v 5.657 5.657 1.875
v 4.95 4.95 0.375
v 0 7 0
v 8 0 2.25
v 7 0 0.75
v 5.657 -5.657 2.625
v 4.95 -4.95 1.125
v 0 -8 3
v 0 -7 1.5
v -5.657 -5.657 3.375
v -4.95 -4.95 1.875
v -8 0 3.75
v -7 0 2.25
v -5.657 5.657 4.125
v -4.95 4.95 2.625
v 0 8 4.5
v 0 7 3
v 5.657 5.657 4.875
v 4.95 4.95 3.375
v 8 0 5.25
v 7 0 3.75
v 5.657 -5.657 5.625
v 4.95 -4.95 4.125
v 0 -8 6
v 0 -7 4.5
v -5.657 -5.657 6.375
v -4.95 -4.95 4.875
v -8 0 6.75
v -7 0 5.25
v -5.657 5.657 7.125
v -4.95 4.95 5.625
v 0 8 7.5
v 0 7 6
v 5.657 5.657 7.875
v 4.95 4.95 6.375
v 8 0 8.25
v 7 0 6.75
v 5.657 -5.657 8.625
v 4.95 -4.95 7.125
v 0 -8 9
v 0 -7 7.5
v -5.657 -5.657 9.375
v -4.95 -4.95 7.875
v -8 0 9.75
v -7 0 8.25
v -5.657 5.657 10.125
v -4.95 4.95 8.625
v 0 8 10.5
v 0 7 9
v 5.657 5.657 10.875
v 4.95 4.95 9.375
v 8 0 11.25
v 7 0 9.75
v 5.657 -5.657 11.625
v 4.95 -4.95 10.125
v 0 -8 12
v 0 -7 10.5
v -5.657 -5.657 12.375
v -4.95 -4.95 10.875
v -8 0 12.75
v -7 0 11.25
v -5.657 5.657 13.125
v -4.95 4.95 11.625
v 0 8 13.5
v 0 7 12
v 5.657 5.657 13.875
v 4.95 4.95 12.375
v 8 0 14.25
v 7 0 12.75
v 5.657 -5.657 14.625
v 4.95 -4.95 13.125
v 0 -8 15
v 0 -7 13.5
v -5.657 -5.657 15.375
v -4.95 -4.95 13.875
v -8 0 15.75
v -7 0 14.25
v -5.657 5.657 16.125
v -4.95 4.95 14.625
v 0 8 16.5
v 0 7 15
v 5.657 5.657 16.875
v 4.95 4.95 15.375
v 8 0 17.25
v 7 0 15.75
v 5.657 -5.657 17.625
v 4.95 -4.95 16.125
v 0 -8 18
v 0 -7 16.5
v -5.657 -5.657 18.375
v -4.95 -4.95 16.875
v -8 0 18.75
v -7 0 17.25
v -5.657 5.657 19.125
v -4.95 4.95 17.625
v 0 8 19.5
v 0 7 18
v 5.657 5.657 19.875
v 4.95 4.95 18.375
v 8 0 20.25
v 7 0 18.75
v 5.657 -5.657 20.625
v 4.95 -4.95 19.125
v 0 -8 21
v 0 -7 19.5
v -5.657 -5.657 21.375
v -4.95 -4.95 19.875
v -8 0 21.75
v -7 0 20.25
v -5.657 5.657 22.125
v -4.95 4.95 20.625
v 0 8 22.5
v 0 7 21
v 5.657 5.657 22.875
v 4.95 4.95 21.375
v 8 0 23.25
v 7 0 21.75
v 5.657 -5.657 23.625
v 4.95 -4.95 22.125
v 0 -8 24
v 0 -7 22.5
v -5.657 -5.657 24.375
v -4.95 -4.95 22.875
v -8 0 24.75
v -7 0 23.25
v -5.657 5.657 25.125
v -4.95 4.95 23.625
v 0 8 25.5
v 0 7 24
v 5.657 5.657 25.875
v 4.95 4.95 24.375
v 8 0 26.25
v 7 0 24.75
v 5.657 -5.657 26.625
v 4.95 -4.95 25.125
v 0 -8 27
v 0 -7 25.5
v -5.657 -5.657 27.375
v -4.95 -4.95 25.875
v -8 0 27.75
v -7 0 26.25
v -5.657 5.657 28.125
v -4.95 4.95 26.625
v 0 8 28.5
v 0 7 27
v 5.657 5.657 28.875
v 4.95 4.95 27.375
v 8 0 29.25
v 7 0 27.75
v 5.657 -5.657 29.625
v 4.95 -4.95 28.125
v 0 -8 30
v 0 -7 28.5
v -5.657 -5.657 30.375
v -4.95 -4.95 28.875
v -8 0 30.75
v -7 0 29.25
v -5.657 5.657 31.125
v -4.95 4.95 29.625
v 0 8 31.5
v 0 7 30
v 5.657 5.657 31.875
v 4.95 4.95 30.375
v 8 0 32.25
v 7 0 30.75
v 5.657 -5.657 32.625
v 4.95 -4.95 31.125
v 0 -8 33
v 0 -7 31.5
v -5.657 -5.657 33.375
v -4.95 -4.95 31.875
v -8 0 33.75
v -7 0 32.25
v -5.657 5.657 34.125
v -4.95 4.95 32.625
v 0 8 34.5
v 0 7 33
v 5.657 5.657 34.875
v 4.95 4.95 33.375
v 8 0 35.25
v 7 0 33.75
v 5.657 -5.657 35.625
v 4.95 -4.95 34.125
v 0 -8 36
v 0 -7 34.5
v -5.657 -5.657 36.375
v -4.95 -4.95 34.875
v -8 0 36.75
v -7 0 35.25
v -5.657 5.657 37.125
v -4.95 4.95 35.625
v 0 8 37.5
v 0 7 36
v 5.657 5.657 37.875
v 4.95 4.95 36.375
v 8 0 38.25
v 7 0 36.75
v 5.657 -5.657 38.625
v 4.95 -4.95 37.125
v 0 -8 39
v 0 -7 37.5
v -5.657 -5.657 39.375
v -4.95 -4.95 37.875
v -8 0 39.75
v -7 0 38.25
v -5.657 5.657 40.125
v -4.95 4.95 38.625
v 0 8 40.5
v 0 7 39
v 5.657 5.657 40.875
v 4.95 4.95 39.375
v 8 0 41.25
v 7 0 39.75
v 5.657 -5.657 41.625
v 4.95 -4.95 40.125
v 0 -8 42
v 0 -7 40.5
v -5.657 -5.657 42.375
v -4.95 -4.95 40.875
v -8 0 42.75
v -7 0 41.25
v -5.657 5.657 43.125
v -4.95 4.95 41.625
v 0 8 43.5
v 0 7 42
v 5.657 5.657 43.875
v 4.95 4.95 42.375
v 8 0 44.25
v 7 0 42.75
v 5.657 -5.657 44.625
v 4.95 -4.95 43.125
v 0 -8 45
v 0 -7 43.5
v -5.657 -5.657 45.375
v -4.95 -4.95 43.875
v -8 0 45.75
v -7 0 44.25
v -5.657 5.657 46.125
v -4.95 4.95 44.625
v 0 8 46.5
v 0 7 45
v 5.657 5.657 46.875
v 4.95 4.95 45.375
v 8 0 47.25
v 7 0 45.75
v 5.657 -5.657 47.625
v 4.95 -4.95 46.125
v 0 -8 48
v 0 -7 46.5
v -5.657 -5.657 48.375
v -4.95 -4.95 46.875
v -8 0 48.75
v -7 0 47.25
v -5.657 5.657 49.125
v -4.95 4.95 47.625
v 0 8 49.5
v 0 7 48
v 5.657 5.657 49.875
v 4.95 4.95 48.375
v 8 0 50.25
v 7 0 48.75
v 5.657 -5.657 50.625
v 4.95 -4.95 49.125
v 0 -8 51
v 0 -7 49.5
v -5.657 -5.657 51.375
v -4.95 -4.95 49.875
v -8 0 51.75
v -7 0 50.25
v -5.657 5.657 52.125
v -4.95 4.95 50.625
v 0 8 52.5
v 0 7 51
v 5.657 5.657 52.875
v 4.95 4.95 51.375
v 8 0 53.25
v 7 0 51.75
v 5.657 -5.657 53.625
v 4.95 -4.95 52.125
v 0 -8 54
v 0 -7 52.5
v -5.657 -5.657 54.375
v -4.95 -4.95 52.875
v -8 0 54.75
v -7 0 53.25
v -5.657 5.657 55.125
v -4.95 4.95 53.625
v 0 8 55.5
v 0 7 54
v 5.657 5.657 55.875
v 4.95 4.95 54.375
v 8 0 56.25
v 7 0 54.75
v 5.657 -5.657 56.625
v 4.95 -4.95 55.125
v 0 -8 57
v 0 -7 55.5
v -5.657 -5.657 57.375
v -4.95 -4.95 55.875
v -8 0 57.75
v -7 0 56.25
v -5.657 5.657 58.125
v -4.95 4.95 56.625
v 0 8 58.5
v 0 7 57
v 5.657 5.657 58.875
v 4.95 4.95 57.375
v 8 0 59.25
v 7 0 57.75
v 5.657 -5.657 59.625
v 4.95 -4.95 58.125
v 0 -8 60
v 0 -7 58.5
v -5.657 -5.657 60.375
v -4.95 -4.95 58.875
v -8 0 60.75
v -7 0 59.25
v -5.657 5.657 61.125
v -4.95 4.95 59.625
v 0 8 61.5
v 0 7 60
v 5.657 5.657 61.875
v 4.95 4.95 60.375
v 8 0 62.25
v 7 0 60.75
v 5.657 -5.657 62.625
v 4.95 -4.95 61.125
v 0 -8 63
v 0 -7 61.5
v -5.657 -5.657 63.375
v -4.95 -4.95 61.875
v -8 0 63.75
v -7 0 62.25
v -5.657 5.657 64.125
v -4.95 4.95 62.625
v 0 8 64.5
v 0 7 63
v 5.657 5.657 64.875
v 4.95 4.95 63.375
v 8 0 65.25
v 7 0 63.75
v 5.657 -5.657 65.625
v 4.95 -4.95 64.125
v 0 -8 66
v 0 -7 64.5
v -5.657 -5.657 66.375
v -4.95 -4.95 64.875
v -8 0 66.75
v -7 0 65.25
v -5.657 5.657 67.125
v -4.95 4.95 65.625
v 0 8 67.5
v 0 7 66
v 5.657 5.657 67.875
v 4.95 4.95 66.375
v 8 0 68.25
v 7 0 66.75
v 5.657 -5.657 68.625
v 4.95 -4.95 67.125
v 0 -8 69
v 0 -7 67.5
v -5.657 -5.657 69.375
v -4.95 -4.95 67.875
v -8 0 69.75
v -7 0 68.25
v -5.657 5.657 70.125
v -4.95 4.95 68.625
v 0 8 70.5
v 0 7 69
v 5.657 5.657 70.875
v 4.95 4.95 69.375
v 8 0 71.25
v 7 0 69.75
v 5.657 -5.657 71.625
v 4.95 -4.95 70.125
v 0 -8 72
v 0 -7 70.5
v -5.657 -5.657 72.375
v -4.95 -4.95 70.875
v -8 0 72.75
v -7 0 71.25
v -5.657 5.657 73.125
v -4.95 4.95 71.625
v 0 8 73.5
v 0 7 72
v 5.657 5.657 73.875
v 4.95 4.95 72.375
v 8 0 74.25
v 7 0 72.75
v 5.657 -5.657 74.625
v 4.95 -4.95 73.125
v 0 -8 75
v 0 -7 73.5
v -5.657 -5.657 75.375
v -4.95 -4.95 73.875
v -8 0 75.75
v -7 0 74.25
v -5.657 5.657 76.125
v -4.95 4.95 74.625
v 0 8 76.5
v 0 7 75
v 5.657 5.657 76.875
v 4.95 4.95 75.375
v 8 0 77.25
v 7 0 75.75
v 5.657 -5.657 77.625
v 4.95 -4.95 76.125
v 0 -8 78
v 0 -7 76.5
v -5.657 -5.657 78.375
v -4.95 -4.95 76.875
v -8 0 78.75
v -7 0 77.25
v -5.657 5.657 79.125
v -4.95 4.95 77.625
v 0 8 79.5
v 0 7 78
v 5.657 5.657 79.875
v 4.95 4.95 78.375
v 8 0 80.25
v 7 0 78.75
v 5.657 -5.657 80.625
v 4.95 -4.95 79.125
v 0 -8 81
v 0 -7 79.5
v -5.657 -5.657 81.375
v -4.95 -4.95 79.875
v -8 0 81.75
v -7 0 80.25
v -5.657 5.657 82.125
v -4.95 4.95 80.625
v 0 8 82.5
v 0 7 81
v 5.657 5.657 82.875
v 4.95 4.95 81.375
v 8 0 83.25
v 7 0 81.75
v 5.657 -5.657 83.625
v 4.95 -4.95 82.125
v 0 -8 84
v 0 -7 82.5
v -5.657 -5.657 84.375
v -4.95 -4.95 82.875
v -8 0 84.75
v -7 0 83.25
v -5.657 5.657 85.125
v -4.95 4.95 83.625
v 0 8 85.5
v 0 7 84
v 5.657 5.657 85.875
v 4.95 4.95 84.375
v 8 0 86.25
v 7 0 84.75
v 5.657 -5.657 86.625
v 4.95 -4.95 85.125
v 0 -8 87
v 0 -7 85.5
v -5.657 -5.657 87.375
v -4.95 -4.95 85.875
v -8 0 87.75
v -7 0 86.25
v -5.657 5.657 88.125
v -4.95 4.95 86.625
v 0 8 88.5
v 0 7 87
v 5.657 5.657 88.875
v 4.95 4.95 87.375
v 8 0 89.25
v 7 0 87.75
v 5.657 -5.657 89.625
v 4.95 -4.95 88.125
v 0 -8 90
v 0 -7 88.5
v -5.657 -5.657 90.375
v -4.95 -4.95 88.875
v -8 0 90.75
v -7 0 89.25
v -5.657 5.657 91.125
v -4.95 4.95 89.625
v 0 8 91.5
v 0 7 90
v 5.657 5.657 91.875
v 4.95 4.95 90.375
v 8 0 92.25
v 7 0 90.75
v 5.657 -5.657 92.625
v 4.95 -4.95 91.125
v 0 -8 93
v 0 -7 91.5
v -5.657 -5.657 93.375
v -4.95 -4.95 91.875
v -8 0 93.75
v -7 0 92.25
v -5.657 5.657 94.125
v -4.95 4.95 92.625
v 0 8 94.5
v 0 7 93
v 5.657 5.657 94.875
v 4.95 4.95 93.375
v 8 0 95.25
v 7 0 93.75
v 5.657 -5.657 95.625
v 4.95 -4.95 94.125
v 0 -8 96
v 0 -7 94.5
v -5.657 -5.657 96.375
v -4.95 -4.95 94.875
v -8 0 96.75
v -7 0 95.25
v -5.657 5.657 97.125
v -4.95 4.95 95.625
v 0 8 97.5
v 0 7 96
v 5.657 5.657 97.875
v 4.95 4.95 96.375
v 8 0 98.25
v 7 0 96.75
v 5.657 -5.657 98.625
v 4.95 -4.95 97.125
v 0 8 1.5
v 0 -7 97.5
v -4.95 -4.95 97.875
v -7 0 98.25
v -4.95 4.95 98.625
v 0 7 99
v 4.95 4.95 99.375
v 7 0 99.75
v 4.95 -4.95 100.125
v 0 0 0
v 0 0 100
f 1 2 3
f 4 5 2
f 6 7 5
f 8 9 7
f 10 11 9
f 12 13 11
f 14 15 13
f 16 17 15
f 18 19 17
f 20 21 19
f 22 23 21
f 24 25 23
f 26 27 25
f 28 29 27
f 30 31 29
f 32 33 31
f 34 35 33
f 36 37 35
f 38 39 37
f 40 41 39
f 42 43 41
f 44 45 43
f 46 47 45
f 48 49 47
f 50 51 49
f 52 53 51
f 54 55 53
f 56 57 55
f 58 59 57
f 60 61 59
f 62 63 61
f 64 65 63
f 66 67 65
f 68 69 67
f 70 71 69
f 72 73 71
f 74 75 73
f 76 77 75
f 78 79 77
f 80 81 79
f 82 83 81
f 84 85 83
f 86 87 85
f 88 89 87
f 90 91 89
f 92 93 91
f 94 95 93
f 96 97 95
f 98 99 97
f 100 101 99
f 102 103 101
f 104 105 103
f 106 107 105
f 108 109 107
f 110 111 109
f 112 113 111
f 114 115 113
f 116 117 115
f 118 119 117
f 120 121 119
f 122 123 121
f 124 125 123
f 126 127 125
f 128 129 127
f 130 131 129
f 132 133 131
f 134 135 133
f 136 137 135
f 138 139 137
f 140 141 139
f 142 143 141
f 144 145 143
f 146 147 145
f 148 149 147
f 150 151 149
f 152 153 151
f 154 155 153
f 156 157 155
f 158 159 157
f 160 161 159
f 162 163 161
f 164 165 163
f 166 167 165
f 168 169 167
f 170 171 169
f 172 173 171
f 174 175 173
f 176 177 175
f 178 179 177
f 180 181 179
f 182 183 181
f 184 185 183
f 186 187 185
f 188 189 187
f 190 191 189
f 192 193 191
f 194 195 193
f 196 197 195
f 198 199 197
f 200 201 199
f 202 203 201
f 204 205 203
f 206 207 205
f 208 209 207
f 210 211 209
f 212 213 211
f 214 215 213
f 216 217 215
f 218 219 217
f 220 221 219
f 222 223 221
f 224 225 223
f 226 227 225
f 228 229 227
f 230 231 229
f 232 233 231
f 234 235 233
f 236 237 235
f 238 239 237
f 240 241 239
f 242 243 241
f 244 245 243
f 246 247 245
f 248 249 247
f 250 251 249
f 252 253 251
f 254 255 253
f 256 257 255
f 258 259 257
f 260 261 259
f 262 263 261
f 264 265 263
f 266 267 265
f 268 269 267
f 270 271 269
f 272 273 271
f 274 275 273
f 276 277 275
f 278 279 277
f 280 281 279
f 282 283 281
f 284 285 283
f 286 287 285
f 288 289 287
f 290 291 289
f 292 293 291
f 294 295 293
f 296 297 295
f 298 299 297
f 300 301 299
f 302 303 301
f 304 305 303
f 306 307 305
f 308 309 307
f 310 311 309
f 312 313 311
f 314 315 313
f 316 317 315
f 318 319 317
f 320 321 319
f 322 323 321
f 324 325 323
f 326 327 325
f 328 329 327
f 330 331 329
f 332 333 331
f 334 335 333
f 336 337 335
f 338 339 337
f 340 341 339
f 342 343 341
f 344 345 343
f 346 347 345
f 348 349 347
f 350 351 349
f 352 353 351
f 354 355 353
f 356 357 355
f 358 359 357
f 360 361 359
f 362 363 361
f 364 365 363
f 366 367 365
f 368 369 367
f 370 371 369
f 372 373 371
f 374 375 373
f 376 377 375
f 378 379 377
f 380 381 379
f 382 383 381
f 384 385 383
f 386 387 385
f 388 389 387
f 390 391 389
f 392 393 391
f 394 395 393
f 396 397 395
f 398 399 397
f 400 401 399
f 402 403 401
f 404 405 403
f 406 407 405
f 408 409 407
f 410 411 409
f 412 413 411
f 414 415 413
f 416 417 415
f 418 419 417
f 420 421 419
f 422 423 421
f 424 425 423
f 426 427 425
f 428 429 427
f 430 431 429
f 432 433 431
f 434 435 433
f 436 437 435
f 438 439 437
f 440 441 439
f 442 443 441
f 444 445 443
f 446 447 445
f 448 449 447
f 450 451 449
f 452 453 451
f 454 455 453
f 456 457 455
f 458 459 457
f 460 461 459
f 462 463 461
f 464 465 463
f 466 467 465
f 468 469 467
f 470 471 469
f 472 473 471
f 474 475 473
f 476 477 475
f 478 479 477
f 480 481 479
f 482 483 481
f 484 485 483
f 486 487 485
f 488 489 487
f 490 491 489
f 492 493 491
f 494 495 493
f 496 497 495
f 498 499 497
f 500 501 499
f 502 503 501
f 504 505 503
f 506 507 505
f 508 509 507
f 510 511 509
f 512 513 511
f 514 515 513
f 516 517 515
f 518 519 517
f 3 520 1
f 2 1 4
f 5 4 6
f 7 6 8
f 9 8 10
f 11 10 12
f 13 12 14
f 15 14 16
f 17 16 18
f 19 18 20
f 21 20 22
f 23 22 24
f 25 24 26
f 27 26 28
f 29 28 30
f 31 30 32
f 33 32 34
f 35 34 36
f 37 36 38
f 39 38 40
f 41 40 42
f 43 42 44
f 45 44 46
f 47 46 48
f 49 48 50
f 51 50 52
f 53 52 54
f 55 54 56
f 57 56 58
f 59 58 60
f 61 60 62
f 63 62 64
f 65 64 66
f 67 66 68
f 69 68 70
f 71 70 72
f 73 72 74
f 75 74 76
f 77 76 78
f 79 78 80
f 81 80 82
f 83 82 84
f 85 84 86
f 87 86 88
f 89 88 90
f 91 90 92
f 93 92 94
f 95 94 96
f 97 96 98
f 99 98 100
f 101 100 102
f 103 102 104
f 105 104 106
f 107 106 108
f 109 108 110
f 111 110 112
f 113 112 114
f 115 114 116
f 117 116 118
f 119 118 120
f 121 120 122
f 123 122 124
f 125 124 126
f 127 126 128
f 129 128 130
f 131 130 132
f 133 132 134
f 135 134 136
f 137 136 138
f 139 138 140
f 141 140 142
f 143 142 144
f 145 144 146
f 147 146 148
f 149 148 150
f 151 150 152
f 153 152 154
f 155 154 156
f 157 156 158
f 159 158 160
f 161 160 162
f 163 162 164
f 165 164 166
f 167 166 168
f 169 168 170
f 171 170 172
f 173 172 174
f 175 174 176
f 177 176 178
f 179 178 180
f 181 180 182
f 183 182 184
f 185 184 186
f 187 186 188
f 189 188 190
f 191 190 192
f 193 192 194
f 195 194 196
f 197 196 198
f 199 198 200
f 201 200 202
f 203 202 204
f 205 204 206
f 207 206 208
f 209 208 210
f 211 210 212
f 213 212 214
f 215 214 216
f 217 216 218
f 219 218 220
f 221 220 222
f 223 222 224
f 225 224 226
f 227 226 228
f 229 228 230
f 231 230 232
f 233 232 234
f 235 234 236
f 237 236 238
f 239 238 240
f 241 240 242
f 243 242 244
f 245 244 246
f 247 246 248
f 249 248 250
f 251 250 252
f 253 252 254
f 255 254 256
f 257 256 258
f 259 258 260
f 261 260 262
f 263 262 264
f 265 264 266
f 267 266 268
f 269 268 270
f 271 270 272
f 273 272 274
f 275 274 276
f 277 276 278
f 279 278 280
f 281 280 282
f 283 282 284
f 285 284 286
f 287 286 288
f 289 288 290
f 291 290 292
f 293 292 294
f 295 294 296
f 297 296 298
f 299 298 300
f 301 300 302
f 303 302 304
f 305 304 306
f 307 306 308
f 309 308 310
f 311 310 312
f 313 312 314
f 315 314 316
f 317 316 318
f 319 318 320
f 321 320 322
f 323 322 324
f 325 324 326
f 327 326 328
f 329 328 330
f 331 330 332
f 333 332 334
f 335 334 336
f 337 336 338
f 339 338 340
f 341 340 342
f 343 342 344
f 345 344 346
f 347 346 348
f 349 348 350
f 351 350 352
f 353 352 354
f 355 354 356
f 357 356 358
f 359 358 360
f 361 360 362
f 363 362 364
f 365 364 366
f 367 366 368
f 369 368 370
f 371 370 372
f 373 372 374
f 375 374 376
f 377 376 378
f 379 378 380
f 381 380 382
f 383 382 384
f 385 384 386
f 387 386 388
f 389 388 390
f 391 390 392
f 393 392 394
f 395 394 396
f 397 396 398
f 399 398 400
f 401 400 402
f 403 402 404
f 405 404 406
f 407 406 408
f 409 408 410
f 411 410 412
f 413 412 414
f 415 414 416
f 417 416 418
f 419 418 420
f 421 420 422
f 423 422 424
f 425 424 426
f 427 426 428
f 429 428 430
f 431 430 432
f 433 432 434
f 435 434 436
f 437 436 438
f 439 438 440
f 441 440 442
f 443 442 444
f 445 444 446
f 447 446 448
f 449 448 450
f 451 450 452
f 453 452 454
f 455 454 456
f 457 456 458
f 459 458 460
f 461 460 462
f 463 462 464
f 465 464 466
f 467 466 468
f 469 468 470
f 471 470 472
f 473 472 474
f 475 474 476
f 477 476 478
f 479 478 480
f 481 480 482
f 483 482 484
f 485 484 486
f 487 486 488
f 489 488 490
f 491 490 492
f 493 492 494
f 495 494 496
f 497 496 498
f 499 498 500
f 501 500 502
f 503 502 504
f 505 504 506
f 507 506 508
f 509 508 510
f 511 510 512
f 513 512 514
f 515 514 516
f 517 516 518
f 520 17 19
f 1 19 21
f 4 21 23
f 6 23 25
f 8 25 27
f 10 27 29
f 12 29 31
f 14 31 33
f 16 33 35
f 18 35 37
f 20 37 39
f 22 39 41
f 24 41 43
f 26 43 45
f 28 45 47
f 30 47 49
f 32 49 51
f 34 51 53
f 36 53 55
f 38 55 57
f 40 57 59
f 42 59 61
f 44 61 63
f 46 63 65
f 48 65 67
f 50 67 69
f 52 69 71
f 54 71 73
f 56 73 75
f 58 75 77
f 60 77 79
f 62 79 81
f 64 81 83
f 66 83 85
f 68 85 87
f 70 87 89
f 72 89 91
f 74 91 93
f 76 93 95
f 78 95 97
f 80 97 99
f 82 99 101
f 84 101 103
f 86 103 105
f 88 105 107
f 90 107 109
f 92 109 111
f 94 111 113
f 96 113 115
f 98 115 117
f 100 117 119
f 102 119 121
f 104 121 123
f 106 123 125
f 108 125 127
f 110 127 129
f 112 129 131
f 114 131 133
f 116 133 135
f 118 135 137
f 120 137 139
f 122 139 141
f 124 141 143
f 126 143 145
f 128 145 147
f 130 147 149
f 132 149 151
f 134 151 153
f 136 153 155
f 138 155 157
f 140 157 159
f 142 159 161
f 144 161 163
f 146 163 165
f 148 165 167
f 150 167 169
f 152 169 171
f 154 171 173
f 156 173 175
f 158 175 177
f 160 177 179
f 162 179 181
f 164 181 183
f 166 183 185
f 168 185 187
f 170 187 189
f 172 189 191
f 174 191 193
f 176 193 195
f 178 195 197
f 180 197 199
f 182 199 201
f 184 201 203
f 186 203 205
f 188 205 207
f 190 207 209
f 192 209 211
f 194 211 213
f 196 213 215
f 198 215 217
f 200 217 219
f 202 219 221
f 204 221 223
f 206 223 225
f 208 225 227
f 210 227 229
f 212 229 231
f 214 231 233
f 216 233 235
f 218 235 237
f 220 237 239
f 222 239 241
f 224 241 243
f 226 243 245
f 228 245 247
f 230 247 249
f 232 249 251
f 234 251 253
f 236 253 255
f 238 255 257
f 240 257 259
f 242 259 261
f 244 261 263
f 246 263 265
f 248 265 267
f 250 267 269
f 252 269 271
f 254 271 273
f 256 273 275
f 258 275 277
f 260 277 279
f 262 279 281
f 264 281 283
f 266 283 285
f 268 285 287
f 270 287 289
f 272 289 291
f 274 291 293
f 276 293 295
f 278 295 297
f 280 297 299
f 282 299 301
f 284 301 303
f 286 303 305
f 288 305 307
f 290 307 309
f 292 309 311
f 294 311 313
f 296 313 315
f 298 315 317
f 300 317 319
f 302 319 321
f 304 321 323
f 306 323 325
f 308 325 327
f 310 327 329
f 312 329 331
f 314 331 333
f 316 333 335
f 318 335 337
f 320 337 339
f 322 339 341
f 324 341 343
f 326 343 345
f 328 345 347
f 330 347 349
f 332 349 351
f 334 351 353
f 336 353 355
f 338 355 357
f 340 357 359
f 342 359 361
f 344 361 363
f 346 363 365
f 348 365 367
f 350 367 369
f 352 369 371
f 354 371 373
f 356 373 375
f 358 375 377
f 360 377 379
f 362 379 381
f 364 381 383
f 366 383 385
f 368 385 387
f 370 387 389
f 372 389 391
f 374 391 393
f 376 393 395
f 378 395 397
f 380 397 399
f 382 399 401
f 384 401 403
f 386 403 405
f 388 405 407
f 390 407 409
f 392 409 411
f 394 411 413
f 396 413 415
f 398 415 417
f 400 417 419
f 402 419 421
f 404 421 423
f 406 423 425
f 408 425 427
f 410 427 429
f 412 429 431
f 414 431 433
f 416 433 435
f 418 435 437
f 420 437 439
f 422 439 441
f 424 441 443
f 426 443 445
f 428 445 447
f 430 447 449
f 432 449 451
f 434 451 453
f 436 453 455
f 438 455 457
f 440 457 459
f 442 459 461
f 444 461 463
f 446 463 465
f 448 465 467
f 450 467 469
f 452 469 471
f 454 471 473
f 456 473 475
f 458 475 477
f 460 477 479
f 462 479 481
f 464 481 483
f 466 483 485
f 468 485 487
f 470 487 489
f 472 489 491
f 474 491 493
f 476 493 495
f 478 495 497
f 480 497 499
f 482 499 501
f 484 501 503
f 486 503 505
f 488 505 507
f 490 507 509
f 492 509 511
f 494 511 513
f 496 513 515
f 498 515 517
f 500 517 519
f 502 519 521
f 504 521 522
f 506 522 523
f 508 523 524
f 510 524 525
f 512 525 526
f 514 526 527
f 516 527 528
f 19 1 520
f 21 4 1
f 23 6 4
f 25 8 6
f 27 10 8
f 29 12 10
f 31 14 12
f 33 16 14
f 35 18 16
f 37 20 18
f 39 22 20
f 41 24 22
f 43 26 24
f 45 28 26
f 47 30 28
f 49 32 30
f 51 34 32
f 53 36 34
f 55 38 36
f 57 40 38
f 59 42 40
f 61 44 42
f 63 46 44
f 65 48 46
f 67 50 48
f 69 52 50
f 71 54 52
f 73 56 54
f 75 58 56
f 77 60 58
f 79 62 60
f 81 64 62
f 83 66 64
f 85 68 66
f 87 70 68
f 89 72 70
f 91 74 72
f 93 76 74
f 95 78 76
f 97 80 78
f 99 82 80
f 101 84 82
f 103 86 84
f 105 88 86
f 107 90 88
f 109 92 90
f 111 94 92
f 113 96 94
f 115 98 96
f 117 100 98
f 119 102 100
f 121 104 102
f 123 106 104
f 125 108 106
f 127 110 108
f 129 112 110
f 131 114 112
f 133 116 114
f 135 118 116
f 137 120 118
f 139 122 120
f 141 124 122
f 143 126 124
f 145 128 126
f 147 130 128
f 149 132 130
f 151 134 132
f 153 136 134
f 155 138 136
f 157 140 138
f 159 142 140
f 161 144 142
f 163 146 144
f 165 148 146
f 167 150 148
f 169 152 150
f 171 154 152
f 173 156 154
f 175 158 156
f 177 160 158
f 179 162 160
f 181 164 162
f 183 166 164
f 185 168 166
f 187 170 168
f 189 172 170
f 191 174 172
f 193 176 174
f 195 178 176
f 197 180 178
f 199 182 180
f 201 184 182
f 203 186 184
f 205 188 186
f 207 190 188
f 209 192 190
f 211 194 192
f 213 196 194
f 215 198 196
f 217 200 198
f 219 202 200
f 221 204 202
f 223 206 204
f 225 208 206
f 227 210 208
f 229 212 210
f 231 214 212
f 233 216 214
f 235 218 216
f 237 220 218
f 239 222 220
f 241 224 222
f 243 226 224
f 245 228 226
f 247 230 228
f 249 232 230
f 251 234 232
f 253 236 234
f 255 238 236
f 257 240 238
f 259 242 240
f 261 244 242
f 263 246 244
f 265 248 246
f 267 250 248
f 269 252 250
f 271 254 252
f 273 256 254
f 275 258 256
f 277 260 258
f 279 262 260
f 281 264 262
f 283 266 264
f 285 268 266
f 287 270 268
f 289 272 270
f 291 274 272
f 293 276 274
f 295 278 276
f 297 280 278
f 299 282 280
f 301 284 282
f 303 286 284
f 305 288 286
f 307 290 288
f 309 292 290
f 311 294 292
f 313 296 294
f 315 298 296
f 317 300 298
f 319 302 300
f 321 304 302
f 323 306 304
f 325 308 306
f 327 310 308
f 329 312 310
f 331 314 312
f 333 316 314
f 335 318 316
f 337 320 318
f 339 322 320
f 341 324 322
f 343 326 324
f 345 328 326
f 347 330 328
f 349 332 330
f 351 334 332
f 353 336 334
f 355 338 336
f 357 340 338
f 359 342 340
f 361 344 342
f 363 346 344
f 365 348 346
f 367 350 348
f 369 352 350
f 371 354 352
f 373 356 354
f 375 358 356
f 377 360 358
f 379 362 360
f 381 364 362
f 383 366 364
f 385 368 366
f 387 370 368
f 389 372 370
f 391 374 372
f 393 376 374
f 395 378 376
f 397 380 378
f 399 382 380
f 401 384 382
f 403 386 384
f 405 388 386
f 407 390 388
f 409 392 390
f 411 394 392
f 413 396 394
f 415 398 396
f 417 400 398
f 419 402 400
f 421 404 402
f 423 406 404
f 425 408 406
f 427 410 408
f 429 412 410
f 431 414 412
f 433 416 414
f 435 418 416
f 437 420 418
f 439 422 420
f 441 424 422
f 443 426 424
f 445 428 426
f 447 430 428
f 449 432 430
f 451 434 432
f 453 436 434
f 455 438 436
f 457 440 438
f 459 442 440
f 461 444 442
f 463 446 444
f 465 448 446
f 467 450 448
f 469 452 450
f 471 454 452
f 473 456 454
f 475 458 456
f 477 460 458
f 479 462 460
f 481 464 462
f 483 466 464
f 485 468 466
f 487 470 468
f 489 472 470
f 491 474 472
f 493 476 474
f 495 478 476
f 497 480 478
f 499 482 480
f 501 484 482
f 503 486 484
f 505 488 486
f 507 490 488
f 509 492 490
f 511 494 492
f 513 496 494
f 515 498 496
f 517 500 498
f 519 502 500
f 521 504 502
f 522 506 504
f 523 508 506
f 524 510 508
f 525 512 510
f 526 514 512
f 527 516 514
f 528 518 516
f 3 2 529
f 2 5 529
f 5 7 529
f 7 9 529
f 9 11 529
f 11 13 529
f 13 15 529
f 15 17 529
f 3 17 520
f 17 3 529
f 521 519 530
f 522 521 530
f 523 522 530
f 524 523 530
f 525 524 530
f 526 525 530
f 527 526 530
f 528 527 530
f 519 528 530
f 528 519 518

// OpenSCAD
module screw_thread (
    points_per_revolution,
    height_per_revolution,
    height,
    inner_radius,
    outer_radius
) {
    number_of_points = ceil(points_per_revolution * height / height_per_revolution);

    inner_points = [for(point = [0:number_of_points])[
        sin(360 * point / points_per_revolution) * inner_radius,
        cos(360 * point / points_per_revolution) * inner_radius,
        point * height_per_revolution / points_per_revolution
    ]];

    outer_points = [for(point = [0:number_of_points - points_per_revolution])[
        sin(360 * point / points_per_revolution) * outer_radius,
        cos(360 * point / points_per_revolution) * outer_radius,
        point * height_per_revolution / points_per_revolution + height_per_revolution / 2
    ]];

    points = concat(inner_points, outer_points, [
        [0, 0, 0],
        [0, 0, height]
    ]);

    lower_faces_a = [for(point = [0:number_of_points - points_per_revolution - 1])[
        point,
        point + 1,
        point + number_of_points + 2
    ]];

    lower_faces_b = [for(point = [0:number_of_points - points_per_revolution - 1])[
        point + number_of_points + 2,    
        point + number_of_points + 1,
        point
    ]];

    lower_faces = concat(lower_faces_a, lower_faces_b);

    upper_faces_a = [for(point = [0:number_of_points - points_per_revolution - 1])[
        point + points_per_revolution + 1,    
        point + points_per_revolution,
        point + number_of_points + 1
    ]];

    upper_faces_b = [for(point = [0:number_of_points - points_per_revolution - 1])[
        point + number_of_points + 1,    
        point + number_of_points + 2,
        point + points_per_revolution + 1
    ]];

    upper_faces = concat(upper_faces_a, upper_faces_b);

    lower_cap_faces = [for(point = [0:points_per_revolution - 1]) [
        2 + number_of_points + number_of_points - points_per_revolution,
        point + 1,
        point
    ]];

    lower_cap_to_side_faces = [[
        0,
        number_of_points + 1,
        points_per_revolution,
        2 + number_of_points + number_of_points - points_per_revolution
    ]];

    upper_cap_faces = [for(point = [0:points_per_revolution - 1]) [
        3 + number_of_points + number_of_points - points_per_revolution,
        number_of_points - points_per_revolution + point,
        number_of_points - points_per_revolution + point + 1
    ]];

    upper_cap_to_side_faces = [[
        number_of_points,
        1 + number_of_points + number_of_points - points_per_revolution,
        number_of_points - points_per_revolution,
        3 + number_of_points + number_of_points - points_per_revolution
    ]];

    faces = concat(
        lower_faces, 
        upper_faces, 
        lower_cap_faces, 
        lower_cap_to_side_faces, 
        upper_cap_faces, 
        upper_cap_to_side_faces
    );

    polyhedron(points = points, faces = faces);
}

screw_thread(8, 3, 100, 7, 8);
